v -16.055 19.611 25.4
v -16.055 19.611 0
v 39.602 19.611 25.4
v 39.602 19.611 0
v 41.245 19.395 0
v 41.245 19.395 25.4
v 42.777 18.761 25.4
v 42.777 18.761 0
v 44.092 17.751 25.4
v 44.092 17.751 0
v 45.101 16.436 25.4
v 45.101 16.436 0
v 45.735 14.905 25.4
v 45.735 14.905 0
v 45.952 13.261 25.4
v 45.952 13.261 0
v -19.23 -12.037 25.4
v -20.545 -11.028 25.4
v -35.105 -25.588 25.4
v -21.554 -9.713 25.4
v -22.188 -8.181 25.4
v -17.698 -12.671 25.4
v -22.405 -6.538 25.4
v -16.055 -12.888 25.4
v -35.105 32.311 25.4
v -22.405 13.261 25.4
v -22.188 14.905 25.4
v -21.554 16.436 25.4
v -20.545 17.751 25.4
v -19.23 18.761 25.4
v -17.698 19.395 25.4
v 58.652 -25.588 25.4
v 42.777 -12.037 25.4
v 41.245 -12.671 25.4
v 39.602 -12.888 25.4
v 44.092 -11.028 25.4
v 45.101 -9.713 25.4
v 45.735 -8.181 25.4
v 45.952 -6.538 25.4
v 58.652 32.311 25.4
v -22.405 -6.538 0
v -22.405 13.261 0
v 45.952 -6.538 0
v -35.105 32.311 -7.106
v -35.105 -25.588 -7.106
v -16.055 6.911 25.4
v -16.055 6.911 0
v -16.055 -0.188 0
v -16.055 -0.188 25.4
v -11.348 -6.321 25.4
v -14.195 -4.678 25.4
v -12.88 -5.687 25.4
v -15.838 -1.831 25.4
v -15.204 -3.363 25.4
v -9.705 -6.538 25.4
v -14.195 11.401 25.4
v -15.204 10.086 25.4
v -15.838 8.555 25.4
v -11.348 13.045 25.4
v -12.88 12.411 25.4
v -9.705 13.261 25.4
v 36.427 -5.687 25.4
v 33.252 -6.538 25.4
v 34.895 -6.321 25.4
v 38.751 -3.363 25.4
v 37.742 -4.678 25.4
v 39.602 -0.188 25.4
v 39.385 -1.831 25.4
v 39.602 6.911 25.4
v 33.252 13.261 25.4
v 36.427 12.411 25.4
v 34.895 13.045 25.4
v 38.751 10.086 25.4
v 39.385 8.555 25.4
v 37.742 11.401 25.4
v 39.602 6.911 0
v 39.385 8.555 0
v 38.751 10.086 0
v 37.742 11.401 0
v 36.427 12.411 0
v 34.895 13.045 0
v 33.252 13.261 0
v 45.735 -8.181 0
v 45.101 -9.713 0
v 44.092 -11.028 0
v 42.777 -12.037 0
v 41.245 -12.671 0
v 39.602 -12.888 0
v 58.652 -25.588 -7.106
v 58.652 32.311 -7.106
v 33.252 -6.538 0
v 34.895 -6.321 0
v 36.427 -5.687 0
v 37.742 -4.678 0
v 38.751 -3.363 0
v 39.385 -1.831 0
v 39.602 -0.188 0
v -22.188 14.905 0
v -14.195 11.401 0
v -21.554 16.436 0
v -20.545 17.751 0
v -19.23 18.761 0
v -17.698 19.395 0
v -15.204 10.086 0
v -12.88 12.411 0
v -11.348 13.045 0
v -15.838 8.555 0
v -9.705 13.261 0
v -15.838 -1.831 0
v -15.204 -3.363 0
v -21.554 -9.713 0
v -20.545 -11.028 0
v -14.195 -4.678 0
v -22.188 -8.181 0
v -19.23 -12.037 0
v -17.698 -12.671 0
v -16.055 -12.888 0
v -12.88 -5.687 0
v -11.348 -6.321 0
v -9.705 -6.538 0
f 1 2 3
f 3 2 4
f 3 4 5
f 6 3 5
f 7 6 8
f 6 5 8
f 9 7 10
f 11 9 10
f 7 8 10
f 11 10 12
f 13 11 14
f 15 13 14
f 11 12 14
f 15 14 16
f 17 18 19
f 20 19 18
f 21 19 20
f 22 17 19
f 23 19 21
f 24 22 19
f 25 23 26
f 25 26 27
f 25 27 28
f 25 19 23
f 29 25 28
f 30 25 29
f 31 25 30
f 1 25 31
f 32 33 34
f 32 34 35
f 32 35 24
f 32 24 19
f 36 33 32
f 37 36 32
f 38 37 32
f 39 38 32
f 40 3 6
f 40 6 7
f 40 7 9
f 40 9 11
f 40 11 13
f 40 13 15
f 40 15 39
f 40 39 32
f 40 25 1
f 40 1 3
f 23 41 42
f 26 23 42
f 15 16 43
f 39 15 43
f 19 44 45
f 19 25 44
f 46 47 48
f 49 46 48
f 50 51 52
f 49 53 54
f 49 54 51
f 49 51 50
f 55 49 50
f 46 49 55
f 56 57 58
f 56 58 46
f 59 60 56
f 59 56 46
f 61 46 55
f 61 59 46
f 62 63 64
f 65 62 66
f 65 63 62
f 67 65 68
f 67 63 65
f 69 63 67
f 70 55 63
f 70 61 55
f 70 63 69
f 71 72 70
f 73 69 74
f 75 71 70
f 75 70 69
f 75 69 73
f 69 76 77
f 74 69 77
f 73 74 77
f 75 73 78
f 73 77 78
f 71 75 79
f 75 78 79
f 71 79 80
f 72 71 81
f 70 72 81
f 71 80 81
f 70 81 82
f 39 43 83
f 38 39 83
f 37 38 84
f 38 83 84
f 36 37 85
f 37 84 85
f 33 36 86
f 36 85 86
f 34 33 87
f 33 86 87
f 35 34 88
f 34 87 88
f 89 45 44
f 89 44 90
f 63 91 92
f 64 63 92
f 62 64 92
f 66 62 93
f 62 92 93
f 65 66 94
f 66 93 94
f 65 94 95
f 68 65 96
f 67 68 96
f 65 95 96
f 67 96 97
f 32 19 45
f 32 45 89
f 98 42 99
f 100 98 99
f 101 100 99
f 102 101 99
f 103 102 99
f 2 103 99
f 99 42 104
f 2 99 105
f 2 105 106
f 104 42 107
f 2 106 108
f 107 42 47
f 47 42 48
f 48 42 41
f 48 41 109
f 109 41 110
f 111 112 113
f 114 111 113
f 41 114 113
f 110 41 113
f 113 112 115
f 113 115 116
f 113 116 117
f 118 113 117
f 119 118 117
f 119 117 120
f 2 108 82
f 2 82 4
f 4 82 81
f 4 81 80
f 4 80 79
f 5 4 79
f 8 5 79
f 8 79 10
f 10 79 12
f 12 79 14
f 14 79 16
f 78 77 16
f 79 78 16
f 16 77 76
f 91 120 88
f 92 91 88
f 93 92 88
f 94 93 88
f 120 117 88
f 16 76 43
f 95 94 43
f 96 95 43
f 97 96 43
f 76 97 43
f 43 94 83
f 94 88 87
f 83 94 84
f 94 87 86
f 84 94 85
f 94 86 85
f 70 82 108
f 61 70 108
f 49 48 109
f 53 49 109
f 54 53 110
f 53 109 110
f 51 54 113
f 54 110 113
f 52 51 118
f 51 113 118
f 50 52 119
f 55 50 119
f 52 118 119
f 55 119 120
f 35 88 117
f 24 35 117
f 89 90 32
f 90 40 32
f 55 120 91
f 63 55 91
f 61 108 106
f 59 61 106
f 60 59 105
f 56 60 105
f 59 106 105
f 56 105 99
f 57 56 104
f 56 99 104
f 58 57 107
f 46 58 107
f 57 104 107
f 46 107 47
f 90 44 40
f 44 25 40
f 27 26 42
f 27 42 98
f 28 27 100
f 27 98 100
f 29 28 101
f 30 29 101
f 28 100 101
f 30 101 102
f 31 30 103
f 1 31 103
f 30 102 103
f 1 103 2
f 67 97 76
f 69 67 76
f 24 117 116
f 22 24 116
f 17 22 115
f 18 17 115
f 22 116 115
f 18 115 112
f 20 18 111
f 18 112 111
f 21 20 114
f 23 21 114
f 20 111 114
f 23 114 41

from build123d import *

# Parameters (mm, degrees)
F0_W     = 93.756211
F0_H     = 57.899028
F1_DEPTH = 25.4
F2_W     = 93.756211
F2_H     = 57.899028
F3_DEPTH = 7.105513
F6_DEPTH = 25.4


with BuildPart() as f1:
    # F0 (on Top) → F1 (new body)
    with BuildSketch(Plane.XY):
        with Locations((11.77345, 3.361836)):
            Rectangle(F0_W, F0_H)
        with BuildLine():
            Line((39.601556, -12.887678), (-16.054655, -12.887678))
            ThreePointArc((-16.054655, -12.887678), (-20.544783, -11.027806), (-22.404655, -6.537678))
            Line((-22.404655, -6.537678), (-22.404655, 13.26135))
            ThreePointArc((-22.404655, 13.26135), (-20.544783, 17.751478), (-16.054655, 19.61135))
            Line((-16.054655, 19.61135), (39.601556, 19.61135))
            ThreePointArc((39.601556, 19.61135), (44.091684, 17.751478), (45.951556, 13.26135))
            Line((45.951556, 13.26135), (45.951556, -6.537678))
            ThreePointArc((45.951556, -6.537678), (44.091684, -11.027806), (39.601556, -12.887678))
        make_face(mode=Mode.SUBTRACT)
    extrude(amount=F1_DEPTH)

    # F2 (on face) → F3 (join)
    with BuildSketch(Plane(origin=(0, 0, 0), x_dir=(1, 0, 0), z_dir=(0, 0, -1))):
        with Locations((11.77345, -3.361836)):
            Rectangle(F2_W, F2_H)
    extrude(amount=F3_DEPTH)

    # F5 (on face) → F6 (join)
    with BuildSketch(Plane.XY):
        with BuildLine():
            Line((-16.054655, 6.91135), (-16.054655, -0.187678))
            ThreePointArc((-16.054655, -0.187678), (-14.194783, -4.677806), (-9.704655, -6.537678))
            Line((-9.704655, -6.537678), (33.251556, -6.537678))
            ThreePointArc((33.251556, -6.537678), (37.741684, -4.677806), (39.601556, -0.187678))
            Line((39.601556, -0.187678), (39.601556, 6.91135))
            ThreePointArc((39.601556, 6.91135), (37.741684, 11.401478), (33.251556, 13.26135))
            Line((33.251556, 13.26135), (-9.704655, 13.26135))
            ThreePointArc((-9.704655, 13.26135), (-14.194783, 11.401478), (-16.054655, 6.91135))
        make_face()
    extrude(amount=F6_DEPTH)


solid = f1.part
